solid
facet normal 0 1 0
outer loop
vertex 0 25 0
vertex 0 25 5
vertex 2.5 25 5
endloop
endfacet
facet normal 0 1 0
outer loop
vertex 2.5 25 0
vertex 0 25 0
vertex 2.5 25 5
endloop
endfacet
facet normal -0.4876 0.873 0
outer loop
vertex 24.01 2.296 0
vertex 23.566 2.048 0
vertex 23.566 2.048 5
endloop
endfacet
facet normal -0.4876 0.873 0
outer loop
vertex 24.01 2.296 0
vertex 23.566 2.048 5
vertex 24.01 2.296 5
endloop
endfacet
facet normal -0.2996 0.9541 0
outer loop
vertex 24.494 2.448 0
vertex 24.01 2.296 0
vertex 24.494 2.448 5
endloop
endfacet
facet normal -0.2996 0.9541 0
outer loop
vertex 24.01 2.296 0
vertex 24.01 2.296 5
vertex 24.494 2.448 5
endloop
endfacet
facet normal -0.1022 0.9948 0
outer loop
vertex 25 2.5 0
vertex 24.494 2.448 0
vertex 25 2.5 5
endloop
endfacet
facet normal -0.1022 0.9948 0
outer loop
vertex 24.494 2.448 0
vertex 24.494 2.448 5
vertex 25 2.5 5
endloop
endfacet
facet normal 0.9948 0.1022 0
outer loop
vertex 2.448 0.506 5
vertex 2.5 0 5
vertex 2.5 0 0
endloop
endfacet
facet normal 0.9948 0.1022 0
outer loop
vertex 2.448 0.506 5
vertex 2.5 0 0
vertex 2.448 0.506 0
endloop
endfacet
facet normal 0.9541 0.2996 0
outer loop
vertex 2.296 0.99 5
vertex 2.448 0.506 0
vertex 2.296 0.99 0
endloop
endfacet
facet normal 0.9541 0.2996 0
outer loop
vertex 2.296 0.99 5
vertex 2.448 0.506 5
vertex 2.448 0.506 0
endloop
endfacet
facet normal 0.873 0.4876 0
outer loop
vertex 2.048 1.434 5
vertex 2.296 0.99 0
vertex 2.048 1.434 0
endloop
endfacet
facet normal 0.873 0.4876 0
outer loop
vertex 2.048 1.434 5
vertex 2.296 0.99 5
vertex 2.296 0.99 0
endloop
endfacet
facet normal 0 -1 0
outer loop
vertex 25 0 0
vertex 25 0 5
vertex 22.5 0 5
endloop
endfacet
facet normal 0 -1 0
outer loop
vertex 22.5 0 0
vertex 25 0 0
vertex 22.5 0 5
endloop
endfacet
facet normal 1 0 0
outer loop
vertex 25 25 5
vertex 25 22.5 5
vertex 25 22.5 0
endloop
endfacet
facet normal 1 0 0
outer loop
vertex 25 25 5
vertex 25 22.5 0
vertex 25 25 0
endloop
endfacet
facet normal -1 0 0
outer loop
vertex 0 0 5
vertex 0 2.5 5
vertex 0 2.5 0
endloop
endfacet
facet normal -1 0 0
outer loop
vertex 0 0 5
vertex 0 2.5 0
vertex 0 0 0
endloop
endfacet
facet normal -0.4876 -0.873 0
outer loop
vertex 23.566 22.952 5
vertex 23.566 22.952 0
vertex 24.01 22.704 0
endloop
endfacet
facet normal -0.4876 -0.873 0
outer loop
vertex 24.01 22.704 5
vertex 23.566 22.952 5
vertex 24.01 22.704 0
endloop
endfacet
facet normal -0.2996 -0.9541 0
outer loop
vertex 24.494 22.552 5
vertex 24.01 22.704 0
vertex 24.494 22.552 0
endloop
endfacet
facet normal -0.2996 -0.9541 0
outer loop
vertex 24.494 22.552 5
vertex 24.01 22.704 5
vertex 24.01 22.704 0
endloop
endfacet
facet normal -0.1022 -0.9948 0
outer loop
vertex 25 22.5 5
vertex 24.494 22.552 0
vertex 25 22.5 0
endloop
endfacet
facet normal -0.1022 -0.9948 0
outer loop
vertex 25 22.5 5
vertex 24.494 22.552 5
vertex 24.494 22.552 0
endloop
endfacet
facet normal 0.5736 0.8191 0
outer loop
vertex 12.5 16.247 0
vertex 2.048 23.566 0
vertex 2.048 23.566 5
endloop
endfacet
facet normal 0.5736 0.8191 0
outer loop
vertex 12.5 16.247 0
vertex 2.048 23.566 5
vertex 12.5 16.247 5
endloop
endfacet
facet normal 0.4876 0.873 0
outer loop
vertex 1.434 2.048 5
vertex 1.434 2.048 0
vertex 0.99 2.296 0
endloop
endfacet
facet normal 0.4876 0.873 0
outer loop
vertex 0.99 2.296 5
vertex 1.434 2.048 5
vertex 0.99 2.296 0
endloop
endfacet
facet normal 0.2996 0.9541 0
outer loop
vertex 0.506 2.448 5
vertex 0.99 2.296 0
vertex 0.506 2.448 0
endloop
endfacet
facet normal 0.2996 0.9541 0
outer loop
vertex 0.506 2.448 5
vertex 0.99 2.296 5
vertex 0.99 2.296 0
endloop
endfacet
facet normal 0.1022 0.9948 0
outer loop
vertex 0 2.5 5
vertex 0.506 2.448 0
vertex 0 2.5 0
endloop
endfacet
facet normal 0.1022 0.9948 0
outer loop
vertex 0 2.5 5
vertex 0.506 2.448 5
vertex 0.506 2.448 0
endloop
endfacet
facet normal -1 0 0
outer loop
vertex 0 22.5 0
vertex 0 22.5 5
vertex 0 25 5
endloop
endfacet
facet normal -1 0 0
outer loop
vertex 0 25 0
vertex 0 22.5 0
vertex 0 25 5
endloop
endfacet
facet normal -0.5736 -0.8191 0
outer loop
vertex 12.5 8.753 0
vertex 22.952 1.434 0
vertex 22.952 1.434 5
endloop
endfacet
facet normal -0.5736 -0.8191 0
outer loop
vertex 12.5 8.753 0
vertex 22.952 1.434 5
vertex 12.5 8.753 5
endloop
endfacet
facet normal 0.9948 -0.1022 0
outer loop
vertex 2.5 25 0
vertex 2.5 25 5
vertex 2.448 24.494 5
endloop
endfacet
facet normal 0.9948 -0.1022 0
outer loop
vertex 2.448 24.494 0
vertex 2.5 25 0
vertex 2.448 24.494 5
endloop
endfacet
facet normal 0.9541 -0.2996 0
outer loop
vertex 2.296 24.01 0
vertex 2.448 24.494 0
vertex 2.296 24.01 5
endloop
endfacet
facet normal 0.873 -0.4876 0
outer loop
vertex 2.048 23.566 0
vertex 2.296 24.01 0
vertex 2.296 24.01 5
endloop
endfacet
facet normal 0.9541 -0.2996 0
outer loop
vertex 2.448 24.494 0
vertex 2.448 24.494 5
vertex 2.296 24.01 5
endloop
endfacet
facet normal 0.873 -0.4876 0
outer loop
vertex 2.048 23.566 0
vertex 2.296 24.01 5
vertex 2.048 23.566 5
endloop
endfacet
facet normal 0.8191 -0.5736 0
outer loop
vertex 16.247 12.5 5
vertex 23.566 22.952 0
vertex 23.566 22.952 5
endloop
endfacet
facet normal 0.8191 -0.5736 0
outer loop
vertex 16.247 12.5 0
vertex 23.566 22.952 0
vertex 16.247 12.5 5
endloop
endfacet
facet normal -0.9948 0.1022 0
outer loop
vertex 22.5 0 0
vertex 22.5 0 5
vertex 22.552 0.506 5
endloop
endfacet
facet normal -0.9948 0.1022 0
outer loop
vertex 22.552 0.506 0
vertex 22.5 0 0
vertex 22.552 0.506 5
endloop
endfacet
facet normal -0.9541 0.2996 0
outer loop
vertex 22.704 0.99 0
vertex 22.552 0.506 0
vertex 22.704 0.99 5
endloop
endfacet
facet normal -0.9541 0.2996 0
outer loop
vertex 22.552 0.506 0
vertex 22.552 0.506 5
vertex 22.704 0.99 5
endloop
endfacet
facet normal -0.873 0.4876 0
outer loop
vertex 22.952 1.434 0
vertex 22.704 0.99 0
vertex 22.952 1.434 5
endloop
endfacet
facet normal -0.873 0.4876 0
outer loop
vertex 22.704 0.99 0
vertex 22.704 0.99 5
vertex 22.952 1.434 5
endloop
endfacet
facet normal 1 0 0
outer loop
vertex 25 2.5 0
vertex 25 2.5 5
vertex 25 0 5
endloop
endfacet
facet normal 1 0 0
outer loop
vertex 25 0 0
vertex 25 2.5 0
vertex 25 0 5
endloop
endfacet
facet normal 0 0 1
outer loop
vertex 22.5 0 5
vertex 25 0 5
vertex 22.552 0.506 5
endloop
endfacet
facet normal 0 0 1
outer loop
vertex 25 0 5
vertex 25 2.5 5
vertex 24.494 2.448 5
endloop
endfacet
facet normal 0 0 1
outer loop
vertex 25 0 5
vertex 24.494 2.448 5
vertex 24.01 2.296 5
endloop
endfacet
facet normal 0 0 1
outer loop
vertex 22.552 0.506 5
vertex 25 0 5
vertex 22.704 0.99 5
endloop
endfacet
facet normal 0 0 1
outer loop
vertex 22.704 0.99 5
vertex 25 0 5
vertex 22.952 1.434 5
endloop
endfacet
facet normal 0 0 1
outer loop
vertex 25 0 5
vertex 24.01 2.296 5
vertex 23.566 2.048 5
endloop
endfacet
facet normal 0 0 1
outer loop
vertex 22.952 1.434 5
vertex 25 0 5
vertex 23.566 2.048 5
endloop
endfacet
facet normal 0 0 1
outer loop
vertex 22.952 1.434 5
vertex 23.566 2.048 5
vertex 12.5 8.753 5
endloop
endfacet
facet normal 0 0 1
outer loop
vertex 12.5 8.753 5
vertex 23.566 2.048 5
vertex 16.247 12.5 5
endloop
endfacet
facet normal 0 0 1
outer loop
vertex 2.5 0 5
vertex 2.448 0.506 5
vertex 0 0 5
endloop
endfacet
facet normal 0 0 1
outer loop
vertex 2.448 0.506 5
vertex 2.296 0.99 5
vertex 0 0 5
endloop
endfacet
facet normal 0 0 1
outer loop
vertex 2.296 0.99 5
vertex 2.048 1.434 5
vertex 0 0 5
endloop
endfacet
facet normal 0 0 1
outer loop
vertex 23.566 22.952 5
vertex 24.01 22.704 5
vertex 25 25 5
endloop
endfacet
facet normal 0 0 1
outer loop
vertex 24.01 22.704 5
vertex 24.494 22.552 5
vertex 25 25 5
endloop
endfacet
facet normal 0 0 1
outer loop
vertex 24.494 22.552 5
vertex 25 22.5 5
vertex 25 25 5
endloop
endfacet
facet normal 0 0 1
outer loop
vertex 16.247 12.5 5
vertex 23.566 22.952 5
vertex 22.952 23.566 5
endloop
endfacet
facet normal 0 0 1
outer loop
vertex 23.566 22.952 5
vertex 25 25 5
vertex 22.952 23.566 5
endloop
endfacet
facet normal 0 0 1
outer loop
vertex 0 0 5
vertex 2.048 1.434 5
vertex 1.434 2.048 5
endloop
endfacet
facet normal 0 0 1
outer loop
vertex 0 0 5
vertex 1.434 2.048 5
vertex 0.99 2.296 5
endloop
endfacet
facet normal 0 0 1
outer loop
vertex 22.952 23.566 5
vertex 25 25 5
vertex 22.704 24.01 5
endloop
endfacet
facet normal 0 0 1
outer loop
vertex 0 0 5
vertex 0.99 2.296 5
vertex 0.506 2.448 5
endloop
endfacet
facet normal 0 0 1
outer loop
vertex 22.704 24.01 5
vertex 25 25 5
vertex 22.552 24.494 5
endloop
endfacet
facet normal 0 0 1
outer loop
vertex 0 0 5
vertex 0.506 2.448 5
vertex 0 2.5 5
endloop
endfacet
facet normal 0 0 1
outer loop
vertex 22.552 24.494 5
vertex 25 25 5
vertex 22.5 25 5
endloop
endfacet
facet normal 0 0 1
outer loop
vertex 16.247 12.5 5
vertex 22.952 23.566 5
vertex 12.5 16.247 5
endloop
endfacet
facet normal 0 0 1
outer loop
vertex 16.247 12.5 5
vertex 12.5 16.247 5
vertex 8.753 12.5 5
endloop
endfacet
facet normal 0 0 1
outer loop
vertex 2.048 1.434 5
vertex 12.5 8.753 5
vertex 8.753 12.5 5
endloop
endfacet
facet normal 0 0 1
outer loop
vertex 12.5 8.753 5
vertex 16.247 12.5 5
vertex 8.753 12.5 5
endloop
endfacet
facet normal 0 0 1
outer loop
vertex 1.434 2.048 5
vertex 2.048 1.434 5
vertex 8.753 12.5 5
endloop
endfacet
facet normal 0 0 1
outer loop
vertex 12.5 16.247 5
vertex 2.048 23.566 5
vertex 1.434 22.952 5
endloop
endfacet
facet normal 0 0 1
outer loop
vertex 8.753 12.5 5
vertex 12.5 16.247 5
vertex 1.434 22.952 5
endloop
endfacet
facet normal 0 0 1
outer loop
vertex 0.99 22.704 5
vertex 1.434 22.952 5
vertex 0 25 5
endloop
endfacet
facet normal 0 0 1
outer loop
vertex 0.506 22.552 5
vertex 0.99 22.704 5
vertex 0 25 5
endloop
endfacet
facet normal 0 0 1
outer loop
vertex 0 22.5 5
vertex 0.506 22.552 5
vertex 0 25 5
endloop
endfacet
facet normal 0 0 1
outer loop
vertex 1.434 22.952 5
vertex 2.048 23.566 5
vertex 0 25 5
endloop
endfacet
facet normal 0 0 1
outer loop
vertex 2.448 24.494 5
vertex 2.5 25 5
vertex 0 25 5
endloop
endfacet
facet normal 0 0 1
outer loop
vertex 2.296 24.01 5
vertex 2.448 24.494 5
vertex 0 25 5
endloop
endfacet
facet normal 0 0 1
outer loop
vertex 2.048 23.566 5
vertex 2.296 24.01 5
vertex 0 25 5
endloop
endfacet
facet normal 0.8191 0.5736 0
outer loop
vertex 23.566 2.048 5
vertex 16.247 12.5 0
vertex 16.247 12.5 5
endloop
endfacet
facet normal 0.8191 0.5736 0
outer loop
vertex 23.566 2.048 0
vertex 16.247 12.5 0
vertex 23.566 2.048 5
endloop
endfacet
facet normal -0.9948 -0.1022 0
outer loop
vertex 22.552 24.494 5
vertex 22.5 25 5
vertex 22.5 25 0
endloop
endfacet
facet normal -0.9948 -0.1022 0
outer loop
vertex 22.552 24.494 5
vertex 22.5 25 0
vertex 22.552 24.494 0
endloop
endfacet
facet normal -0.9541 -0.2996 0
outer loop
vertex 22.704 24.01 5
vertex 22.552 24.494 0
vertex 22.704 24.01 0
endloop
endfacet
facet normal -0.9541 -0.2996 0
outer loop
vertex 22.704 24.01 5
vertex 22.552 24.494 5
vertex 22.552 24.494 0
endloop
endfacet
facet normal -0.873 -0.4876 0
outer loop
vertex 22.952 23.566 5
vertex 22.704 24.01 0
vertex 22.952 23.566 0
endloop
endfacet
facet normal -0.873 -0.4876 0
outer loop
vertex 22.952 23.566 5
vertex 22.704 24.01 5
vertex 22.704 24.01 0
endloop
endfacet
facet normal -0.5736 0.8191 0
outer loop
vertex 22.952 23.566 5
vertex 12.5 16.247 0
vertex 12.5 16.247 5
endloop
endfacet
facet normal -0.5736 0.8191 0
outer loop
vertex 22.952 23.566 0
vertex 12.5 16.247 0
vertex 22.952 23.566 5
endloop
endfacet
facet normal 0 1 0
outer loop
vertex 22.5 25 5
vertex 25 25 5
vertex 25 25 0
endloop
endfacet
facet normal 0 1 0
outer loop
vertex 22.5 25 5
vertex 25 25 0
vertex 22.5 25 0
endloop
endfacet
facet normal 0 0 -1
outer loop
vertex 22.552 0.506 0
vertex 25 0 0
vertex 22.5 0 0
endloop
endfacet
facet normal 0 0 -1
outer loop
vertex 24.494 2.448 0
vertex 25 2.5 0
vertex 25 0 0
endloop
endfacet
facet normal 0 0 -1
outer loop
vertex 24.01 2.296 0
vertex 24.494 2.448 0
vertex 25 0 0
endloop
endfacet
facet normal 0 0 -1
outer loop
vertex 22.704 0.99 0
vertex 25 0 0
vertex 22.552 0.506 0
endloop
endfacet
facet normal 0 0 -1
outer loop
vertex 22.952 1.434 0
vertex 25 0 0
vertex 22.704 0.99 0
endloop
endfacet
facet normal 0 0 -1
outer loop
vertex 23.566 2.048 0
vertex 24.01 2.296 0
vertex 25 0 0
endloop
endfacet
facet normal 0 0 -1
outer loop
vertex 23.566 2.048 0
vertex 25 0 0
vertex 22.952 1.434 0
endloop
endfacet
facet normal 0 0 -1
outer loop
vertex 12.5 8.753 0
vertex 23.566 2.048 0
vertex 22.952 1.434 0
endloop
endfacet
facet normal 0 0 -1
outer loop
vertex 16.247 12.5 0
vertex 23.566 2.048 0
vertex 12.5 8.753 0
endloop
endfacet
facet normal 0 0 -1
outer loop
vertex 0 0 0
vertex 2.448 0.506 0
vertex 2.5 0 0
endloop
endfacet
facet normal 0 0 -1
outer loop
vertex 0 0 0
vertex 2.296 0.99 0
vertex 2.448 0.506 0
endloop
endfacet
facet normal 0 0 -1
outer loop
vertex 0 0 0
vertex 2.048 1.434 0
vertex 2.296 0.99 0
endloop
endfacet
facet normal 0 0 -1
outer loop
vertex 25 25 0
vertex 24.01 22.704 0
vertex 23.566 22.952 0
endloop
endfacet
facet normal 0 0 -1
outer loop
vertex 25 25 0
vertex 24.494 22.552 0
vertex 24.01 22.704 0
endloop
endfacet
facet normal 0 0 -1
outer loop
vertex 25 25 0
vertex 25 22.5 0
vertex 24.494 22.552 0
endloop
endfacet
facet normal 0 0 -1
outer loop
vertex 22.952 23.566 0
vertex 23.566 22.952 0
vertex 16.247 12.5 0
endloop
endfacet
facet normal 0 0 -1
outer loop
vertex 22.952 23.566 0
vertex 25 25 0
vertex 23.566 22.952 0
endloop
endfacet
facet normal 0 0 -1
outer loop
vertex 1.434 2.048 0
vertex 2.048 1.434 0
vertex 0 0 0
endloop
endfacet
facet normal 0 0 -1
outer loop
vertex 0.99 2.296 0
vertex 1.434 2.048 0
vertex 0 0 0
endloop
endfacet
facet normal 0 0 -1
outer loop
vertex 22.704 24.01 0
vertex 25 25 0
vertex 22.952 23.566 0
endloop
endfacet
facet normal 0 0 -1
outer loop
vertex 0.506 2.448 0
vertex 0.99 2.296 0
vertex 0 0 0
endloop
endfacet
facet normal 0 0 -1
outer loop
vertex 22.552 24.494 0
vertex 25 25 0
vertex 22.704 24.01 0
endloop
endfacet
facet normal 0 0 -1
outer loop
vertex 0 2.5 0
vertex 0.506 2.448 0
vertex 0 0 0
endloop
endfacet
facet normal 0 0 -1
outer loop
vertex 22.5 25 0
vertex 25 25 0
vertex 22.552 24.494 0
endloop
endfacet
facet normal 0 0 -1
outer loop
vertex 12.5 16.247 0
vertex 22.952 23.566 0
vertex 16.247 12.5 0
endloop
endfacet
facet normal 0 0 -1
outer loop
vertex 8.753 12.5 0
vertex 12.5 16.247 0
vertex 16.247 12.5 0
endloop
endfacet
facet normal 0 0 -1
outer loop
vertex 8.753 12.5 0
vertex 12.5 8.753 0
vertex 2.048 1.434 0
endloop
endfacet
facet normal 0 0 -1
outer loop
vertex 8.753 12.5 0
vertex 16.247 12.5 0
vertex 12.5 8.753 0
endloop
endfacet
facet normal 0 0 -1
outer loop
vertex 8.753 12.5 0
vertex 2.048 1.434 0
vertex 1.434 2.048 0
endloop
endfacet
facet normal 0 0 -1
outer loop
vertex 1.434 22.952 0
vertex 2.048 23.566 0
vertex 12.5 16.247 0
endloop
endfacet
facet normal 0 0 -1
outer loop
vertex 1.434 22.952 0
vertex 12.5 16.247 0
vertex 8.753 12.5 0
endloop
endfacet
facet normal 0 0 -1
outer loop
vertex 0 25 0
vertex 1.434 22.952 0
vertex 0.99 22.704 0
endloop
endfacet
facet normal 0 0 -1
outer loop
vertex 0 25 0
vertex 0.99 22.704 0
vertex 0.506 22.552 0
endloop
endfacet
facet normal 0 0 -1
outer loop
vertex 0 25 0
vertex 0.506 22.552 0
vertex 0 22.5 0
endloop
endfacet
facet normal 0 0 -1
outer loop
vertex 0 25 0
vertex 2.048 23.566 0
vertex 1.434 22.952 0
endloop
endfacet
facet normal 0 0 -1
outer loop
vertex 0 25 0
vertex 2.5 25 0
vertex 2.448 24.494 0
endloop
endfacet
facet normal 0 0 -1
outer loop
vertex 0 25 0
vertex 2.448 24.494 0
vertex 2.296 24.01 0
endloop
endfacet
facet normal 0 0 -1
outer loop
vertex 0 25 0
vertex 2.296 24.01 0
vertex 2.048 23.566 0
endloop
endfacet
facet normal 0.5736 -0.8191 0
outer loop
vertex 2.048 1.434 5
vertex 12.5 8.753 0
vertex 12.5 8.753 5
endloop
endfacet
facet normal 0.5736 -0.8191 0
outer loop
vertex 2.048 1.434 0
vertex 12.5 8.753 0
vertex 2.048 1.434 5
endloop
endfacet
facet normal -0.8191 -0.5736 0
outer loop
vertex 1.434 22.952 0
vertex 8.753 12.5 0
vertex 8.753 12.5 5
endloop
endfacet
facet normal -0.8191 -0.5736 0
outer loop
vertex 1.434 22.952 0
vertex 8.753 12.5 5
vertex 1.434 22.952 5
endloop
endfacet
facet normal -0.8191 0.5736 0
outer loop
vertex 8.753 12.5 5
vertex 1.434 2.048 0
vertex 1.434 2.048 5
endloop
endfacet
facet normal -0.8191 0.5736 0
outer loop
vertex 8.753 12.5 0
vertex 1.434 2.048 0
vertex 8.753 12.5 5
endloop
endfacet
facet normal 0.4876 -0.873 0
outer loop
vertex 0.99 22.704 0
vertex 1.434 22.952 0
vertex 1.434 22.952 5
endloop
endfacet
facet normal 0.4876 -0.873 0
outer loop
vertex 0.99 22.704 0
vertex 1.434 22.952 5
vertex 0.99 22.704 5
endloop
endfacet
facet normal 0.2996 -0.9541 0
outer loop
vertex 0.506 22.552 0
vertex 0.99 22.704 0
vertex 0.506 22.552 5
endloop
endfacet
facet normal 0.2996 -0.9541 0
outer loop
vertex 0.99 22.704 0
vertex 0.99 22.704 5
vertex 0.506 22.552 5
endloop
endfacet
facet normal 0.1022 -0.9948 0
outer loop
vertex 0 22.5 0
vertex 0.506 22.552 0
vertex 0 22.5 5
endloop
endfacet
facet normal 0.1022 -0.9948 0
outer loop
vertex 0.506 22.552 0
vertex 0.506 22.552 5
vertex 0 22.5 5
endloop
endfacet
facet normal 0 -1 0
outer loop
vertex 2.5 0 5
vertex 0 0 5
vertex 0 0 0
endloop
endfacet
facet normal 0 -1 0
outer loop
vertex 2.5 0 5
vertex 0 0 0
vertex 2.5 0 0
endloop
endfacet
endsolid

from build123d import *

# Parameters (mm, degrees)
BOSS_EXTRUDE1_DEPTH = 5
BOSS_EXTRUDE2_DEPTH = 5


with BuildPart() as part:
    # Sketch1 → Boss-Extrude1 (new body)
    with BuildSketch(Plane.XY):
        Polygon((0, 0), (8.752594228, 12.5), (0, 25), (12.5, 16.247405772), (25, 25), (16.247405772, 12.5), (25, 0), (12.5, 8.752594228), align=None)
    extrude(amount=BOSS_EXTRUDE1_DEPTH)

    # Sketch2 → Boss-Extrude2 (add)
    with BuildSketch(Plane.XY.offset(5)):
        with BuildLine():
            Line((0, 22.5), (0, 25))
            Line((0, 25), (2.5, 25))
            ThreePointArc((2.5, 25), (1.767766953, 23.232233047), (0, 22.5))
        make_face()
        with BuildLine():
            Line((25, 22.5), (25, 25))
            Line((25, 25), (22.5, 25))
            ThreePointArc((22.5, 25), (23.232233047, 23.232233047), (25, 22.5))
        make_face()
        with BuildLine():
            Line((25, 0), (22.5, 0))
            ThreePointArc((22.5, 0), (23.232233047, 1.767766953), (25, 2.5))
            Line((25, 2.5), (25, 0))
        make_face()
        with BuildLine():
            Line((0, 2.5), (0, 0))
            Line((0, 0), (2.5, 0))
            ThreePointArc((2.5, 0), (1.767766953, 1.767766953), (0, 2.5))
        make_face()
    extrude(amount=-BOSS_EXTRUDE2_DEPTH)


solid = part.part
